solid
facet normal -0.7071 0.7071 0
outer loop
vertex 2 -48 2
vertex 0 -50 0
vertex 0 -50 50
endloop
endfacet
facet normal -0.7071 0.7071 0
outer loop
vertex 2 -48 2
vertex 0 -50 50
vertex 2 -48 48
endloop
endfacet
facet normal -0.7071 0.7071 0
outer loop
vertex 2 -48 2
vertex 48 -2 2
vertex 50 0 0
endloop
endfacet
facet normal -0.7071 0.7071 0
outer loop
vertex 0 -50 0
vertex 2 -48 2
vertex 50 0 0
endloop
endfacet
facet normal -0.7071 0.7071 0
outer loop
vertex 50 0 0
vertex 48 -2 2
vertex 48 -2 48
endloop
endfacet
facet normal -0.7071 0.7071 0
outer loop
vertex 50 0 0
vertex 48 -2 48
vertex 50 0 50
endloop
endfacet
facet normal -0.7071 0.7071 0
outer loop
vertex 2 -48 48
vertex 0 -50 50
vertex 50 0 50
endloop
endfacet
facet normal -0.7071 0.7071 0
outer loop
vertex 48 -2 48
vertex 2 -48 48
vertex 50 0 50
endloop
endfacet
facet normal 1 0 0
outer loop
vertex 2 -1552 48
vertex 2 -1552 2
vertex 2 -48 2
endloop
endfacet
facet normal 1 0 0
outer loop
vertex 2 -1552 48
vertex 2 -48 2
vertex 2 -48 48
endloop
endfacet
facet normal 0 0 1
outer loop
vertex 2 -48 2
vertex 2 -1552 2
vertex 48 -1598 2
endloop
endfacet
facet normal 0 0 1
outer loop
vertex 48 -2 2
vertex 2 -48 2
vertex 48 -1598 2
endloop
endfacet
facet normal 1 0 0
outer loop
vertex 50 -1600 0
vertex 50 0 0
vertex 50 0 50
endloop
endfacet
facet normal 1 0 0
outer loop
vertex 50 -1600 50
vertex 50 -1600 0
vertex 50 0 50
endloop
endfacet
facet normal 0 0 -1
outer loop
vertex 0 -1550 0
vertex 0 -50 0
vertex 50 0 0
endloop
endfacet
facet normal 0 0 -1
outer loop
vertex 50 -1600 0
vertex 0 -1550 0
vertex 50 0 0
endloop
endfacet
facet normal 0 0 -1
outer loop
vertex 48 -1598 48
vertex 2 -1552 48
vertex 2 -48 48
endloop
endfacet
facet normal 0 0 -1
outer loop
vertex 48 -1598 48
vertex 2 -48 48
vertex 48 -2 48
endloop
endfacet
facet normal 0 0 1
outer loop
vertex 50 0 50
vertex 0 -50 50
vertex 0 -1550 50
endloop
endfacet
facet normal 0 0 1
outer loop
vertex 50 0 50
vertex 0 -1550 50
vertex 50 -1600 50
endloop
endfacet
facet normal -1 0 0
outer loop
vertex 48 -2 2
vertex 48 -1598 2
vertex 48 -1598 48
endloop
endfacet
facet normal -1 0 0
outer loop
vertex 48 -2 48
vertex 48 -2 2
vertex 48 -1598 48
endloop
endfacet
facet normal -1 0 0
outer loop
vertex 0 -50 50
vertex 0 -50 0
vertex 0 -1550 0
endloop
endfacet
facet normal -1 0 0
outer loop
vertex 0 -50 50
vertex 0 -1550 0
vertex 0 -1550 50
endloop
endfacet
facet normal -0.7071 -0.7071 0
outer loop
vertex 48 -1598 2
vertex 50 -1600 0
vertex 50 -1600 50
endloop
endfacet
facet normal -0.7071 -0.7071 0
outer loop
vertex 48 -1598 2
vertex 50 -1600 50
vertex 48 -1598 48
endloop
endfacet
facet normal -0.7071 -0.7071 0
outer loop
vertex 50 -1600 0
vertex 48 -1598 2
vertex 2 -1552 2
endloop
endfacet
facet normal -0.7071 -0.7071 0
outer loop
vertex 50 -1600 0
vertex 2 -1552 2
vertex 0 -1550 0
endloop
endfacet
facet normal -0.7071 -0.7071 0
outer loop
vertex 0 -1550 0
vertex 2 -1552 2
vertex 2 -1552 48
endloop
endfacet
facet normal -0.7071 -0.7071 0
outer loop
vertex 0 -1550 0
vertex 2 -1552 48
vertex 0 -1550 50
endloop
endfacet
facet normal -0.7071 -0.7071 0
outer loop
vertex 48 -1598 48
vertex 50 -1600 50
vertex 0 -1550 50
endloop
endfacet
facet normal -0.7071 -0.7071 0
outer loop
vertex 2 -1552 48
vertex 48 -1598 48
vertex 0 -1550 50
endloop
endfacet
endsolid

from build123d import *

# Parameters (mm, degrees)
F0_W     = 50
F0_H     = 50
F0_W_2   = 46
F0_H_2   = 46
F1_DEPTH = 1600
F3_DEPTH = 50
F4_DEPTH = 50


with BuildPart() as f1:
    # F0 (on Front) → F1 (new body)
    with BuildSketch(Plane.XZ):
        with Locations((25, 25)):
            Rectangle(F0_W, F0_H)
        with Locations((25, 25)):
            Rectangle(F0_W_2, F0_H_2, mode=Mode.SUBTRACT)
    extrude(amount=F1_DEPTH)

    # F2 (on face) → F3 (cut)
    with BuildSketch(Plane.XY.offset(50)):
        Polygon((50, 0), (0, 0), (0, -50), align=None)
    extrude(amount=-F3_DEPTH, mode=Mode.SUBTRACT)

    # F2 (on face) → F4 (cut)
    with BuildSketch(Plane.XY.offset(50)):
        Polygon((50, 0), (0, 0), (0, -50), align=None)
        Polygon((0, -1550), (0, -1600), (50, -1600), align=None)
    extrude(amount=-F4_DEPTH, mode=Mode.SUBTRACT)


solid = f1.part
